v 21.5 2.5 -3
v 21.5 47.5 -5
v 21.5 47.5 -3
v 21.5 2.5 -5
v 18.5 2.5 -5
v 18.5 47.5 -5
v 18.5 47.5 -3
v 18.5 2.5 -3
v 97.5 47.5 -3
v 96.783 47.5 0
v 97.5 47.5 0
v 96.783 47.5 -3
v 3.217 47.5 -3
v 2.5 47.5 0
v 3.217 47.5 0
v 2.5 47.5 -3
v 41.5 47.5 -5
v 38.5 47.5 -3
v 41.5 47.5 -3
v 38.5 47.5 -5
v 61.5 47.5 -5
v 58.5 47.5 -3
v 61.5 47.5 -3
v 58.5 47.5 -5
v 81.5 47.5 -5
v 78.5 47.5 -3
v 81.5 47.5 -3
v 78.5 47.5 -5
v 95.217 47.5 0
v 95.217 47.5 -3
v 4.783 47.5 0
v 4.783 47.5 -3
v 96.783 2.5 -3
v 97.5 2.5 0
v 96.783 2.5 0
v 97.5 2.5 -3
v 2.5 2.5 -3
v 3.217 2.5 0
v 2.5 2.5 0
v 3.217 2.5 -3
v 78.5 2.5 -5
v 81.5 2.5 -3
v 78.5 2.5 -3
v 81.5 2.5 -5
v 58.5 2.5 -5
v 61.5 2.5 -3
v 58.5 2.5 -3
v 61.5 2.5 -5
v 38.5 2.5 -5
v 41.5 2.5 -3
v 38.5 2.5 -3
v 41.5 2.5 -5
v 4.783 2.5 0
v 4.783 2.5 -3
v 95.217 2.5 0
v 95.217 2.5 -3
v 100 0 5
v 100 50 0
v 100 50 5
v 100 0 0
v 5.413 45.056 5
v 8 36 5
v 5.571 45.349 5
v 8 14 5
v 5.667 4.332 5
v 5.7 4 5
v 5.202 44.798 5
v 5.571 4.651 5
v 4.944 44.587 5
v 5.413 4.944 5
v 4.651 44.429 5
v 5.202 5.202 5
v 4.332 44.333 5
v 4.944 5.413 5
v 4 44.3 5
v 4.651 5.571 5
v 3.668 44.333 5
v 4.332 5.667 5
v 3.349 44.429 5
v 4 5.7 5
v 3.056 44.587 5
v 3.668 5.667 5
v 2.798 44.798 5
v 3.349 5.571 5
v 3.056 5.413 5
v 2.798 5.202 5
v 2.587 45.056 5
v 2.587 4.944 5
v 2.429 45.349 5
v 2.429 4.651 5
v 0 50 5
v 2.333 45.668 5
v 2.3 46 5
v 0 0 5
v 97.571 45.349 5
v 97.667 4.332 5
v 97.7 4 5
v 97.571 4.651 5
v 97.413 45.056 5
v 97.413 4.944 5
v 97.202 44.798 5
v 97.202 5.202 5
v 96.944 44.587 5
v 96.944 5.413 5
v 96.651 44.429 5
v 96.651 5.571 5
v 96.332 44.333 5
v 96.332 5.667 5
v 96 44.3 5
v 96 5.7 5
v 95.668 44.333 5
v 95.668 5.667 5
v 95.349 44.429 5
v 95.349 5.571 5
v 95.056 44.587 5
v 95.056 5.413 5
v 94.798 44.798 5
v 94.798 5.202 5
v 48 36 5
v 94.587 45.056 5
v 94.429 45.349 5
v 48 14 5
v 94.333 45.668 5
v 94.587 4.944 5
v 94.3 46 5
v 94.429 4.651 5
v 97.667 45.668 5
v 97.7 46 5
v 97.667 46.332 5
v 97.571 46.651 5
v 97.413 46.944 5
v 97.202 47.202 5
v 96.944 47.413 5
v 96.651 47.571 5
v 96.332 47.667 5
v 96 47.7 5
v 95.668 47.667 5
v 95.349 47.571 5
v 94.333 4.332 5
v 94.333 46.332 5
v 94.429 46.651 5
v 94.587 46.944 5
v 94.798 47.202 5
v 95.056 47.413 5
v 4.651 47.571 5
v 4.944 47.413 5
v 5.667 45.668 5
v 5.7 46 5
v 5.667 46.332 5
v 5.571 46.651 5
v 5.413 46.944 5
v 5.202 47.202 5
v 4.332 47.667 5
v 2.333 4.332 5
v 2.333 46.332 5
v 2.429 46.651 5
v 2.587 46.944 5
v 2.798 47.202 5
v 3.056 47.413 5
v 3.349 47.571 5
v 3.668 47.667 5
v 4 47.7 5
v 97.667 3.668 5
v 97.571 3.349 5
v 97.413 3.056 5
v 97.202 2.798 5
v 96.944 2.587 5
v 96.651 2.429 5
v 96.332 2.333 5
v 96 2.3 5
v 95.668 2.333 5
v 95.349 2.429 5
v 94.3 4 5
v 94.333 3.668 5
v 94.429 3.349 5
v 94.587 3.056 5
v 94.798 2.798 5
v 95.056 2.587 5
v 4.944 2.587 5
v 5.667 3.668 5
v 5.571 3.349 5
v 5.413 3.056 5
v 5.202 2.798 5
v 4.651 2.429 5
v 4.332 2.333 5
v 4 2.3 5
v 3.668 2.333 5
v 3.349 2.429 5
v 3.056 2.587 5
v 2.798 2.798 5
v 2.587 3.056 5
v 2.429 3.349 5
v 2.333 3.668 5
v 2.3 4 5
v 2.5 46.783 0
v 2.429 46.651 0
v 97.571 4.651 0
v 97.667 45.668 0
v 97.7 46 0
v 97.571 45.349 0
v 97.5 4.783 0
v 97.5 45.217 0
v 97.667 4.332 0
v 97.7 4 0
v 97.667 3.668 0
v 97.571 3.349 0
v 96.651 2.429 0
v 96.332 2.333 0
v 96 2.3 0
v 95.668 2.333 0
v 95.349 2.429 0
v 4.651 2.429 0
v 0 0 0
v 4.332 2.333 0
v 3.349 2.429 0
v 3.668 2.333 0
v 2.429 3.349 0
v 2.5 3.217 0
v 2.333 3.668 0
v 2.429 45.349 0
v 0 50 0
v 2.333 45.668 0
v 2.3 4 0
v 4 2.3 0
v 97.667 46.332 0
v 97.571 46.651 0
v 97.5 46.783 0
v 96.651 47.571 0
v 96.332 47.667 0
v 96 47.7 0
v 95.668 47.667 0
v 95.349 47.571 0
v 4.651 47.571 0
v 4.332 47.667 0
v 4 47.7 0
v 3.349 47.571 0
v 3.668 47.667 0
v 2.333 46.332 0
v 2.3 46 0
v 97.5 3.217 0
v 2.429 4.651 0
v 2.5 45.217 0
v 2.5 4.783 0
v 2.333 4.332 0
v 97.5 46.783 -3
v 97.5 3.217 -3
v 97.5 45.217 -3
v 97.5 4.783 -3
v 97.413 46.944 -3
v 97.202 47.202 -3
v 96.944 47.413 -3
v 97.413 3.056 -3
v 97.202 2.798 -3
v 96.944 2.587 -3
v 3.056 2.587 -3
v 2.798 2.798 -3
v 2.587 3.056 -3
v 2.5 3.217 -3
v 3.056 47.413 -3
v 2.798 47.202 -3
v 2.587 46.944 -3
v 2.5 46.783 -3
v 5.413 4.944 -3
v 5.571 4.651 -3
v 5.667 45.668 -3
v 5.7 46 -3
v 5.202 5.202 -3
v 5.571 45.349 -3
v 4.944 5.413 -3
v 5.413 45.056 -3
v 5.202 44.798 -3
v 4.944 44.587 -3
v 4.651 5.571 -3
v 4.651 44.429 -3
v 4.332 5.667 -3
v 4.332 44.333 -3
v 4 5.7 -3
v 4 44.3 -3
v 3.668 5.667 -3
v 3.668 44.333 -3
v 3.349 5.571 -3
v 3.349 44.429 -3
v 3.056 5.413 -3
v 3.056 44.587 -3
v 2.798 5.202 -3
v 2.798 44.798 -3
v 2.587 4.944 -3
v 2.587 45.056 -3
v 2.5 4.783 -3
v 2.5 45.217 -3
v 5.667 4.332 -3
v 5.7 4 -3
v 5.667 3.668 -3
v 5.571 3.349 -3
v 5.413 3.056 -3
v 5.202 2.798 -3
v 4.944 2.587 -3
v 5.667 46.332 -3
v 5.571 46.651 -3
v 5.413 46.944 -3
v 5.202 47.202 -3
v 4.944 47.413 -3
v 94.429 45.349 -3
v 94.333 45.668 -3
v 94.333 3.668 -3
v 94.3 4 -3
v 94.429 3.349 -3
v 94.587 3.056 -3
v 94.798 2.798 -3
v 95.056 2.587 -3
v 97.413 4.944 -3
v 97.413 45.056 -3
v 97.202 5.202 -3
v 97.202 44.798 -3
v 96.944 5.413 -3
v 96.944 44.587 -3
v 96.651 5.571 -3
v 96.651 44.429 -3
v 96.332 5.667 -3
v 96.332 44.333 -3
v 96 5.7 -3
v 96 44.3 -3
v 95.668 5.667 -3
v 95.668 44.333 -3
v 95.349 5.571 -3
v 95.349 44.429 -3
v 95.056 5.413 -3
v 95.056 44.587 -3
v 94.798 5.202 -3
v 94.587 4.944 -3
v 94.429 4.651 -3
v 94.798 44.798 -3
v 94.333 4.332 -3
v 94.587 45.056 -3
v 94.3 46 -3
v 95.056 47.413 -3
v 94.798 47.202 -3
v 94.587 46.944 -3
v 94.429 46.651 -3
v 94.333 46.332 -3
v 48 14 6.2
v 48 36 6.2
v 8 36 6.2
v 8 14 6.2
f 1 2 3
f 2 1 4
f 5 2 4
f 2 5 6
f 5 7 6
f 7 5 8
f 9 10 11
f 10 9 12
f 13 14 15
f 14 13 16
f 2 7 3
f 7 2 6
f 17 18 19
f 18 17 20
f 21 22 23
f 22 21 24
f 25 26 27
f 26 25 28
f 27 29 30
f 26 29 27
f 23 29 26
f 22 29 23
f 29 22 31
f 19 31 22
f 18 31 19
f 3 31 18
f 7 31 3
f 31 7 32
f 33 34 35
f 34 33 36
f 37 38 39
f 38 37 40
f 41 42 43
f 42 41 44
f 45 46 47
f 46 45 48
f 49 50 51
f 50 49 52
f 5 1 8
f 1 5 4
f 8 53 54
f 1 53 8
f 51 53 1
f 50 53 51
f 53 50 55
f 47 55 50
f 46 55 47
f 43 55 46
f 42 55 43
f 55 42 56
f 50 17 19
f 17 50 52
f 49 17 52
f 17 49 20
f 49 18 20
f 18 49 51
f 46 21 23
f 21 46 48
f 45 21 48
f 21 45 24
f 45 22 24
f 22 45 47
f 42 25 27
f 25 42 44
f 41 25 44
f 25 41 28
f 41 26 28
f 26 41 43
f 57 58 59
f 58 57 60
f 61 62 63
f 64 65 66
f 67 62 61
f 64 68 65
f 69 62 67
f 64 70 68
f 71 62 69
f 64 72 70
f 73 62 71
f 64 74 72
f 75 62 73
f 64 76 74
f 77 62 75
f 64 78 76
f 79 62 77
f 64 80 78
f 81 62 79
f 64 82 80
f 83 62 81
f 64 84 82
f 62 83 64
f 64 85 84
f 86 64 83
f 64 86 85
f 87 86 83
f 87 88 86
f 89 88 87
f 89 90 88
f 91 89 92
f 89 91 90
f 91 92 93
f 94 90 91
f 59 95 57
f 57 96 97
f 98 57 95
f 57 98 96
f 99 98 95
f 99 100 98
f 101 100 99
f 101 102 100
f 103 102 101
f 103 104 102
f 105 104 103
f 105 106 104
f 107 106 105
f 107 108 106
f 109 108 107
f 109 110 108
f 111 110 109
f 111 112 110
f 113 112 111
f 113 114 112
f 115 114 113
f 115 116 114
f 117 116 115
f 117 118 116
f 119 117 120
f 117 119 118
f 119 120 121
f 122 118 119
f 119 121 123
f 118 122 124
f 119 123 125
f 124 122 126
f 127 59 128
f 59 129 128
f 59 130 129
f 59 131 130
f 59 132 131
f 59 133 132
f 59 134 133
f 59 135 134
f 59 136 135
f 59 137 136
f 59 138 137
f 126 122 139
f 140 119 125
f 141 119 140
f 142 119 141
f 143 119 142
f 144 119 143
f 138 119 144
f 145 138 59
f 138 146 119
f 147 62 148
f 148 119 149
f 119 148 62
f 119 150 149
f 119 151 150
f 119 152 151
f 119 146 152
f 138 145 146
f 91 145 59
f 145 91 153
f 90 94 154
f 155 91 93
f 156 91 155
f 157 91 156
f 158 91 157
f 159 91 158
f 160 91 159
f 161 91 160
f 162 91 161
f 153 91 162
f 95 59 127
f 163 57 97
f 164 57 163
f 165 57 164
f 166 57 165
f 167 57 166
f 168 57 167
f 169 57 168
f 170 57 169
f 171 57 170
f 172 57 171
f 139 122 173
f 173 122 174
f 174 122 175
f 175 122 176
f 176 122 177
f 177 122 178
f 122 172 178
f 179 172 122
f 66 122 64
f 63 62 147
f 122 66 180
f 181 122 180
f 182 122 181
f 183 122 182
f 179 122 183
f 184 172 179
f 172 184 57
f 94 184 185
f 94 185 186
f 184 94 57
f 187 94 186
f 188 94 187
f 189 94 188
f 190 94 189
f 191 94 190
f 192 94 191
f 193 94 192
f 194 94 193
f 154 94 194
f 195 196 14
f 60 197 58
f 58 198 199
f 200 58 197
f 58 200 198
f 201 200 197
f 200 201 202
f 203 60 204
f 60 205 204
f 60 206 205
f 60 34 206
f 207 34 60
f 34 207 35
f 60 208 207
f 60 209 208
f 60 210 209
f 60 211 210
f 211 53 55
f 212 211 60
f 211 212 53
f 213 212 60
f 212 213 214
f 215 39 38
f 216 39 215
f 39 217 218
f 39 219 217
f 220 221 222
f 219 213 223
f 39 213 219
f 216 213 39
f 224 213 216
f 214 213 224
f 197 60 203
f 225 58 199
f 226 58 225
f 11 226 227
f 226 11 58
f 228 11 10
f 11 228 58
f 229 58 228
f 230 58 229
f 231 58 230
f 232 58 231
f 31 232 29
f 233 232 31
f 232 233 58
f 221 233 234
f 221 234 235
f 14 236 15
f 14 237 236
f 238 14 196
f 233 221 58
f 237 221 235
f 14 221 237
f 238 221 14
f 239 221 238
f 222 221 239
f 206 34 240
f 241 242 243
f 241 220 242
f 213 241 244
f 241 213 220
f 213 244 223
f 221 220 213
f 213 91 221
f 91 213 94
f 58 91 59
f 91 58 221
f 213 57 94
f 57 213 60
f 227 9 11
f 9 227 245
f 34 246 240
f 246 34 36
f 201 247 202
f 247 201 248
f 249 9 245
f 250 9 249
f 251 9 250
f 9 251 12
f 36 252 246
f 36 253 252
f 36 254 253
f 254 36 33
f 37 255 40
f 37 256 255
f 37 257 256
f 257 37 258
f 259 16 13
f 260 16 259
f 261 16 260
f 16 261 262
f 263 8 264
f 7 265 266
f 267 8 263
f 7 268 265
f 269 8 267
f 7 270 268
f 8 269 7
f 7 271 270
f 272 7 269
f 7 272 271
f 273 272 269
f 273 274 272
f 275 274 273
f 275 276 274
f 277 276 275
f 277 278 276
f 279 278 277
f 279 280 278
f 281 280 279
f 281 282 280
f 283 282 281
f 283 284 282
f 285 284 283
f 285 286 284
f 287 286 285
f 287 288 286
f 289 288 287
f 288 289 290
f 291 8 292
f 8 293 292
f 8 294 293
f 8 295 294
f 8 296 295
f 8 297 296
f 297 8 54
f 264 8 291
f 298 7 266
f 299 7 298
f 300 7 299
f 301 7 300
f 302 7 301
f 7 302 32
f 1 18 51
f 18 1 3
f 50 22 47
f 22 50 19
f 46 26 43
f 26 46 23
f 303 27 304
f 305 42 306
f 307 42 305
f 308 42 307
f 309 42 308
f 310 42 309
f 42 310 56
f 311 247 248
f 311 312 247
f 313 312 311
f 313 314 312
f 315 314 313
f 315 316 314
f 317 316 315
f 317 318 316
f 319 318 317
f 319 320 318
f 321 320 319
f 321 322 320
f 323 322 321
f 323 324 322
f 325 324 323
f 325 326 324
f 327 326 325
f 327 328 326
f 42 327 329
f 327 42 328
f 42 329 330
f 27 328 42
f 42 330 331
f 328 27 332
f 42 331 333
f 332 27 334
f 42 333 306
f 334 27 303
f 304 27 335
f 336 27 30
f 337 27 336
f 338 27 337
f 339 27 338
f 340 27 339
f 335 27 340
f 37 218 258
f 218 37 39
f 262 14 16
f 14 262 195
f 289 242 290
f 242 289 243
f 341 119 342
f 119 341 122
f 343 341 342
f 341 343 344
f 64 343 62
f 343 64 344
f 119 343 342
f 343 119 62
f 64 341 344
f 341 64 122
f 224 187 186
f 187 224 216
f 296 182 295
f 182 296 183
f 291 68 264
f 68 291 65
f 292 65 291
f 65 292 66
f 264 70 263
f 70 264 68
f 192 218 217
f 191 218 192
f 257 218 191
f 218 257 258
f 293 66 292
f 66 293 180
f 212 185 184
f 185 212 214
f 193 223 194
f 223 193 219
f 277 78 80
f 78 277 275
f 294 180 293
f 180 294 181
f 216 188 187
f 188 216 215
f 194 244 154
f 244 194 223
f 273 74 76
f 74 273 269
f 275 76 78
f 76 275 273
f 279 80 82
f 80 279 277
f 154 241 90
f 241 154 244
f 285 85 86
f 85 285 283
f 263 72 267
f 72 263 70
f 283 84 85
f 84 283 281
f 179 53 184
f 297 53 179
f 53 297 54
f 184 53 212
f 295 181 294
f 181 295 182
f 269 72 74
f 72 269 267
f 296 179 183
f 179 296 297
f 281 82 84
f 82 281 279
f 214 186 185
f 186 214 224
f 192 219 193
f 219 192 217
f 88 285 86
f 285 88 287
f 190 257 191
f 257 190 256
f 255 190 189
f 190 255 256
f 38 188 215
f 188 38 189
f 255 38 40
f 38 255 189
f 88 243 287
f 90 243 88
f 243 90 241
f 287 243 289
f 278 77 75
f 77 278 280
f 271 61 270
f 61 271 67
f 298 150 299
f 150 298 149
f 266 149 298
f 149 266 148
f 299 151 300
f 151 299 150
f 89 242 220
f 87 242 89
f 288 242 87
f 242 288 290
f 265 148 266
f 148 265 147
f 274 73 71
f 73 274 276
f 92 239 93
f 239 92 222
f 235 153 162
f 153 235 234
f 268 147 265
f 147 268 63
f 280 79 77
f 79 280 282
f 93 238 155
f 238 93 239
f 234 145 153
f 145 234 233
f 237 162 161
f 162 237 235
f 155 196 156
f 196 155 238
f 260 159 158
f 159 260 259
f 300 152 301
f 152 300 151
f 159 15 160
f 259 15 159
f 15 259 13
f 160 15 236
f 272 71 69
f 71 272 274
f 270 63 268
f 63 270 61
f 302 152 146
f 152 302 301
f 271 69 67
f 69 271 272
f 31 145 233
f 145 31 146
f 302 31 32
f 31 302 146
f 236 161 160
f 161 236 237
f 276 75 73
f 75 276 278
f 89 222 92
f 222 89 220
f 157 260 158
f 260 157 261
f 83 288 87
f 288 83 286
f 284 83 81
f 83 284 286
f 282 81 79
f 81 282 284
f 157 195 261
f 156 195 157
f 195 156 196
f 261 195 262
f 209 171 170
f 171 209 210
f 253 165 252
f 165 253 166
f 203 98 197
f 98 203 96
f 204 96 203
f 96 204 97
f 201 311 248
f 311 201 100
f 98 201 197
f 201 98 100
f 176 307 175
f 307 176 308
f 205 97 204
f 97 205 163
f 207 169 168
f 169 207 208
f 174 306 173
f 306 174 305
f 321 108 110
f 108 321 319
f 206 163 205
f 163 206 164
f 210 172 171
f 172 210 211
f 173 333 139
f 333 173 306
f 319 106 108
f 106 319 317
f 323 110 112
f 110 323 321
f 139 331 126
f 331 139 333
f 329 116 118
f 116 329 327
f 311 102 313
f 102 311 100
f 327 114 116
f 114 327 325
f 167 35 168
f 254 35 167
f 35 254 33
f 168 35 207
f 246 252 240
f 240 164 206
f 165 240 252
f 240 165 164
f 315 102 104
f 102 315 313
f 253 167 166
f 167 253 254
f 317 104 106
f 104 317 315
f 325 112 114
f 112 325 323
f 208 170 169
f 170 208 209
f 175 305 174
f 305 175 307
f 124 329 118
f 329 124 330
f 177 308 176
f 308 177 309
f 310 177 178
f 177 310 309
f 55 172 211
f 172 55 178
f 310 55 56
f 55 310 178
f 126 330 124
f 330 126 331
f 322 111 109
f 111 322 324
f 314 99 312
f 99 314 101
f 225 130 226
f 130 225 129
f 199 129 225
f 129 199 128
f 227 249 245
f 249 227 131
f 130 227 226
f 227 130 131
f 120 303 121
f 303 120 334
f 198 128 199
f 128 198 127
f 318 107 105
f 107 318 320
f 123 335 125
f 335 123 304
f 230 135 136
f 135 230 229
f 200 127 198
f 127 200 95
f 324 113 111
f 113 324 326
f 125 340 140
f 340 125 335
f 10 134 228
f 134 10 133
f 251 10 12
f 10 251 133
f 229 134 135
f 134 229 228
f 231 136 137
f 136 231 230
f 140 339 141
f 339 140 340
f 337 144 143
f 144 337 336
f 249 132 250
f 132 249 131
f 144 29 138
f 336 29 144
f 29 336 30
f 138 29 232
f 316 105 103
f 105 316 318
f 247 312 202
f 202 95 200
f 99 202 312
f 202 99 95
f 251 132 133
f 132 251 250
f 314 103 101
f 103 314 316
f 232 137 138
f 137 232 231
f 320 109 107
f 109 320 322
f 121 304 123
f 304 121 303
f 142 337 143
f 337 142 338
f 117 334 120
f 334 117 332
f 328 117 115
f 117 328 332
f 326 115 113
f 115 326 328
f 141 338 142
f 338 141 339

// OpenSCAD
$fn = 32;

// ----------------------------------------------------------------------
// Enclosure lid: 100 x 50 x 5 mm, 4 bolt holes
// ----------------------------------------------------------------------

// --- parameters (mm) ---
length = 100;             // lid length, X
width = 50;               // lid width, Y
plate_t = 5;              // lid plate thickness
bolt_d = 3.4;             // bolt clearance
boss_lip = 4;             // bolt hole inset from the corner
sink = 1;                 // overlap of the lip and ribs into the plate
lip_h = 4;                // lip height below the plate
lip_wall = 2.5;           // lip wall thickness
rib_n = 4;                // stiffening ribs
rib_t = 3;                // rib thickness
rib_h = 6;                // rib height below the plate
label_h = 1.2;            // raised marking pad

module plate() {
  cube([length, width, plate_t]);
  /* lip that drops into the housing opening, sunk into the plate */
  translate([lip_wall, lip_wall, -lip_h + sink]) cube([length - 2 * lip_wall, width - 2 * lip_wall, lip_h]);
  /* stiffening ribs under the plate */
  for (i = [1 : rib_n]) translate([length * i / (rib_n + 1) - rib_t / 2, lip_wall, -rib_h + sink]) cube([rib_t, width - 2 * lip_wall, rib_h]);
  /* raised marking pad on top, sunk 1 mm into the plate */
  translate([length * 0.08, width * 0.28, plate_t - 1]) cube([length * 0.4, width * 0.44, label_h + 1]);
}

difference() {
  plate();
  /* bolt pattern matching the corner bosses */
  for (sx = [0, 1]) for (sy = [0, 1])
    translate([sx * (length - 2 * boss_lip) + boss_lip, sy * (width - 2 * boss_lip) + boss_lip, -lip_h - 1])
      cylinder(h = plate_t + lip_h + 2, d = bolt_d);
}
